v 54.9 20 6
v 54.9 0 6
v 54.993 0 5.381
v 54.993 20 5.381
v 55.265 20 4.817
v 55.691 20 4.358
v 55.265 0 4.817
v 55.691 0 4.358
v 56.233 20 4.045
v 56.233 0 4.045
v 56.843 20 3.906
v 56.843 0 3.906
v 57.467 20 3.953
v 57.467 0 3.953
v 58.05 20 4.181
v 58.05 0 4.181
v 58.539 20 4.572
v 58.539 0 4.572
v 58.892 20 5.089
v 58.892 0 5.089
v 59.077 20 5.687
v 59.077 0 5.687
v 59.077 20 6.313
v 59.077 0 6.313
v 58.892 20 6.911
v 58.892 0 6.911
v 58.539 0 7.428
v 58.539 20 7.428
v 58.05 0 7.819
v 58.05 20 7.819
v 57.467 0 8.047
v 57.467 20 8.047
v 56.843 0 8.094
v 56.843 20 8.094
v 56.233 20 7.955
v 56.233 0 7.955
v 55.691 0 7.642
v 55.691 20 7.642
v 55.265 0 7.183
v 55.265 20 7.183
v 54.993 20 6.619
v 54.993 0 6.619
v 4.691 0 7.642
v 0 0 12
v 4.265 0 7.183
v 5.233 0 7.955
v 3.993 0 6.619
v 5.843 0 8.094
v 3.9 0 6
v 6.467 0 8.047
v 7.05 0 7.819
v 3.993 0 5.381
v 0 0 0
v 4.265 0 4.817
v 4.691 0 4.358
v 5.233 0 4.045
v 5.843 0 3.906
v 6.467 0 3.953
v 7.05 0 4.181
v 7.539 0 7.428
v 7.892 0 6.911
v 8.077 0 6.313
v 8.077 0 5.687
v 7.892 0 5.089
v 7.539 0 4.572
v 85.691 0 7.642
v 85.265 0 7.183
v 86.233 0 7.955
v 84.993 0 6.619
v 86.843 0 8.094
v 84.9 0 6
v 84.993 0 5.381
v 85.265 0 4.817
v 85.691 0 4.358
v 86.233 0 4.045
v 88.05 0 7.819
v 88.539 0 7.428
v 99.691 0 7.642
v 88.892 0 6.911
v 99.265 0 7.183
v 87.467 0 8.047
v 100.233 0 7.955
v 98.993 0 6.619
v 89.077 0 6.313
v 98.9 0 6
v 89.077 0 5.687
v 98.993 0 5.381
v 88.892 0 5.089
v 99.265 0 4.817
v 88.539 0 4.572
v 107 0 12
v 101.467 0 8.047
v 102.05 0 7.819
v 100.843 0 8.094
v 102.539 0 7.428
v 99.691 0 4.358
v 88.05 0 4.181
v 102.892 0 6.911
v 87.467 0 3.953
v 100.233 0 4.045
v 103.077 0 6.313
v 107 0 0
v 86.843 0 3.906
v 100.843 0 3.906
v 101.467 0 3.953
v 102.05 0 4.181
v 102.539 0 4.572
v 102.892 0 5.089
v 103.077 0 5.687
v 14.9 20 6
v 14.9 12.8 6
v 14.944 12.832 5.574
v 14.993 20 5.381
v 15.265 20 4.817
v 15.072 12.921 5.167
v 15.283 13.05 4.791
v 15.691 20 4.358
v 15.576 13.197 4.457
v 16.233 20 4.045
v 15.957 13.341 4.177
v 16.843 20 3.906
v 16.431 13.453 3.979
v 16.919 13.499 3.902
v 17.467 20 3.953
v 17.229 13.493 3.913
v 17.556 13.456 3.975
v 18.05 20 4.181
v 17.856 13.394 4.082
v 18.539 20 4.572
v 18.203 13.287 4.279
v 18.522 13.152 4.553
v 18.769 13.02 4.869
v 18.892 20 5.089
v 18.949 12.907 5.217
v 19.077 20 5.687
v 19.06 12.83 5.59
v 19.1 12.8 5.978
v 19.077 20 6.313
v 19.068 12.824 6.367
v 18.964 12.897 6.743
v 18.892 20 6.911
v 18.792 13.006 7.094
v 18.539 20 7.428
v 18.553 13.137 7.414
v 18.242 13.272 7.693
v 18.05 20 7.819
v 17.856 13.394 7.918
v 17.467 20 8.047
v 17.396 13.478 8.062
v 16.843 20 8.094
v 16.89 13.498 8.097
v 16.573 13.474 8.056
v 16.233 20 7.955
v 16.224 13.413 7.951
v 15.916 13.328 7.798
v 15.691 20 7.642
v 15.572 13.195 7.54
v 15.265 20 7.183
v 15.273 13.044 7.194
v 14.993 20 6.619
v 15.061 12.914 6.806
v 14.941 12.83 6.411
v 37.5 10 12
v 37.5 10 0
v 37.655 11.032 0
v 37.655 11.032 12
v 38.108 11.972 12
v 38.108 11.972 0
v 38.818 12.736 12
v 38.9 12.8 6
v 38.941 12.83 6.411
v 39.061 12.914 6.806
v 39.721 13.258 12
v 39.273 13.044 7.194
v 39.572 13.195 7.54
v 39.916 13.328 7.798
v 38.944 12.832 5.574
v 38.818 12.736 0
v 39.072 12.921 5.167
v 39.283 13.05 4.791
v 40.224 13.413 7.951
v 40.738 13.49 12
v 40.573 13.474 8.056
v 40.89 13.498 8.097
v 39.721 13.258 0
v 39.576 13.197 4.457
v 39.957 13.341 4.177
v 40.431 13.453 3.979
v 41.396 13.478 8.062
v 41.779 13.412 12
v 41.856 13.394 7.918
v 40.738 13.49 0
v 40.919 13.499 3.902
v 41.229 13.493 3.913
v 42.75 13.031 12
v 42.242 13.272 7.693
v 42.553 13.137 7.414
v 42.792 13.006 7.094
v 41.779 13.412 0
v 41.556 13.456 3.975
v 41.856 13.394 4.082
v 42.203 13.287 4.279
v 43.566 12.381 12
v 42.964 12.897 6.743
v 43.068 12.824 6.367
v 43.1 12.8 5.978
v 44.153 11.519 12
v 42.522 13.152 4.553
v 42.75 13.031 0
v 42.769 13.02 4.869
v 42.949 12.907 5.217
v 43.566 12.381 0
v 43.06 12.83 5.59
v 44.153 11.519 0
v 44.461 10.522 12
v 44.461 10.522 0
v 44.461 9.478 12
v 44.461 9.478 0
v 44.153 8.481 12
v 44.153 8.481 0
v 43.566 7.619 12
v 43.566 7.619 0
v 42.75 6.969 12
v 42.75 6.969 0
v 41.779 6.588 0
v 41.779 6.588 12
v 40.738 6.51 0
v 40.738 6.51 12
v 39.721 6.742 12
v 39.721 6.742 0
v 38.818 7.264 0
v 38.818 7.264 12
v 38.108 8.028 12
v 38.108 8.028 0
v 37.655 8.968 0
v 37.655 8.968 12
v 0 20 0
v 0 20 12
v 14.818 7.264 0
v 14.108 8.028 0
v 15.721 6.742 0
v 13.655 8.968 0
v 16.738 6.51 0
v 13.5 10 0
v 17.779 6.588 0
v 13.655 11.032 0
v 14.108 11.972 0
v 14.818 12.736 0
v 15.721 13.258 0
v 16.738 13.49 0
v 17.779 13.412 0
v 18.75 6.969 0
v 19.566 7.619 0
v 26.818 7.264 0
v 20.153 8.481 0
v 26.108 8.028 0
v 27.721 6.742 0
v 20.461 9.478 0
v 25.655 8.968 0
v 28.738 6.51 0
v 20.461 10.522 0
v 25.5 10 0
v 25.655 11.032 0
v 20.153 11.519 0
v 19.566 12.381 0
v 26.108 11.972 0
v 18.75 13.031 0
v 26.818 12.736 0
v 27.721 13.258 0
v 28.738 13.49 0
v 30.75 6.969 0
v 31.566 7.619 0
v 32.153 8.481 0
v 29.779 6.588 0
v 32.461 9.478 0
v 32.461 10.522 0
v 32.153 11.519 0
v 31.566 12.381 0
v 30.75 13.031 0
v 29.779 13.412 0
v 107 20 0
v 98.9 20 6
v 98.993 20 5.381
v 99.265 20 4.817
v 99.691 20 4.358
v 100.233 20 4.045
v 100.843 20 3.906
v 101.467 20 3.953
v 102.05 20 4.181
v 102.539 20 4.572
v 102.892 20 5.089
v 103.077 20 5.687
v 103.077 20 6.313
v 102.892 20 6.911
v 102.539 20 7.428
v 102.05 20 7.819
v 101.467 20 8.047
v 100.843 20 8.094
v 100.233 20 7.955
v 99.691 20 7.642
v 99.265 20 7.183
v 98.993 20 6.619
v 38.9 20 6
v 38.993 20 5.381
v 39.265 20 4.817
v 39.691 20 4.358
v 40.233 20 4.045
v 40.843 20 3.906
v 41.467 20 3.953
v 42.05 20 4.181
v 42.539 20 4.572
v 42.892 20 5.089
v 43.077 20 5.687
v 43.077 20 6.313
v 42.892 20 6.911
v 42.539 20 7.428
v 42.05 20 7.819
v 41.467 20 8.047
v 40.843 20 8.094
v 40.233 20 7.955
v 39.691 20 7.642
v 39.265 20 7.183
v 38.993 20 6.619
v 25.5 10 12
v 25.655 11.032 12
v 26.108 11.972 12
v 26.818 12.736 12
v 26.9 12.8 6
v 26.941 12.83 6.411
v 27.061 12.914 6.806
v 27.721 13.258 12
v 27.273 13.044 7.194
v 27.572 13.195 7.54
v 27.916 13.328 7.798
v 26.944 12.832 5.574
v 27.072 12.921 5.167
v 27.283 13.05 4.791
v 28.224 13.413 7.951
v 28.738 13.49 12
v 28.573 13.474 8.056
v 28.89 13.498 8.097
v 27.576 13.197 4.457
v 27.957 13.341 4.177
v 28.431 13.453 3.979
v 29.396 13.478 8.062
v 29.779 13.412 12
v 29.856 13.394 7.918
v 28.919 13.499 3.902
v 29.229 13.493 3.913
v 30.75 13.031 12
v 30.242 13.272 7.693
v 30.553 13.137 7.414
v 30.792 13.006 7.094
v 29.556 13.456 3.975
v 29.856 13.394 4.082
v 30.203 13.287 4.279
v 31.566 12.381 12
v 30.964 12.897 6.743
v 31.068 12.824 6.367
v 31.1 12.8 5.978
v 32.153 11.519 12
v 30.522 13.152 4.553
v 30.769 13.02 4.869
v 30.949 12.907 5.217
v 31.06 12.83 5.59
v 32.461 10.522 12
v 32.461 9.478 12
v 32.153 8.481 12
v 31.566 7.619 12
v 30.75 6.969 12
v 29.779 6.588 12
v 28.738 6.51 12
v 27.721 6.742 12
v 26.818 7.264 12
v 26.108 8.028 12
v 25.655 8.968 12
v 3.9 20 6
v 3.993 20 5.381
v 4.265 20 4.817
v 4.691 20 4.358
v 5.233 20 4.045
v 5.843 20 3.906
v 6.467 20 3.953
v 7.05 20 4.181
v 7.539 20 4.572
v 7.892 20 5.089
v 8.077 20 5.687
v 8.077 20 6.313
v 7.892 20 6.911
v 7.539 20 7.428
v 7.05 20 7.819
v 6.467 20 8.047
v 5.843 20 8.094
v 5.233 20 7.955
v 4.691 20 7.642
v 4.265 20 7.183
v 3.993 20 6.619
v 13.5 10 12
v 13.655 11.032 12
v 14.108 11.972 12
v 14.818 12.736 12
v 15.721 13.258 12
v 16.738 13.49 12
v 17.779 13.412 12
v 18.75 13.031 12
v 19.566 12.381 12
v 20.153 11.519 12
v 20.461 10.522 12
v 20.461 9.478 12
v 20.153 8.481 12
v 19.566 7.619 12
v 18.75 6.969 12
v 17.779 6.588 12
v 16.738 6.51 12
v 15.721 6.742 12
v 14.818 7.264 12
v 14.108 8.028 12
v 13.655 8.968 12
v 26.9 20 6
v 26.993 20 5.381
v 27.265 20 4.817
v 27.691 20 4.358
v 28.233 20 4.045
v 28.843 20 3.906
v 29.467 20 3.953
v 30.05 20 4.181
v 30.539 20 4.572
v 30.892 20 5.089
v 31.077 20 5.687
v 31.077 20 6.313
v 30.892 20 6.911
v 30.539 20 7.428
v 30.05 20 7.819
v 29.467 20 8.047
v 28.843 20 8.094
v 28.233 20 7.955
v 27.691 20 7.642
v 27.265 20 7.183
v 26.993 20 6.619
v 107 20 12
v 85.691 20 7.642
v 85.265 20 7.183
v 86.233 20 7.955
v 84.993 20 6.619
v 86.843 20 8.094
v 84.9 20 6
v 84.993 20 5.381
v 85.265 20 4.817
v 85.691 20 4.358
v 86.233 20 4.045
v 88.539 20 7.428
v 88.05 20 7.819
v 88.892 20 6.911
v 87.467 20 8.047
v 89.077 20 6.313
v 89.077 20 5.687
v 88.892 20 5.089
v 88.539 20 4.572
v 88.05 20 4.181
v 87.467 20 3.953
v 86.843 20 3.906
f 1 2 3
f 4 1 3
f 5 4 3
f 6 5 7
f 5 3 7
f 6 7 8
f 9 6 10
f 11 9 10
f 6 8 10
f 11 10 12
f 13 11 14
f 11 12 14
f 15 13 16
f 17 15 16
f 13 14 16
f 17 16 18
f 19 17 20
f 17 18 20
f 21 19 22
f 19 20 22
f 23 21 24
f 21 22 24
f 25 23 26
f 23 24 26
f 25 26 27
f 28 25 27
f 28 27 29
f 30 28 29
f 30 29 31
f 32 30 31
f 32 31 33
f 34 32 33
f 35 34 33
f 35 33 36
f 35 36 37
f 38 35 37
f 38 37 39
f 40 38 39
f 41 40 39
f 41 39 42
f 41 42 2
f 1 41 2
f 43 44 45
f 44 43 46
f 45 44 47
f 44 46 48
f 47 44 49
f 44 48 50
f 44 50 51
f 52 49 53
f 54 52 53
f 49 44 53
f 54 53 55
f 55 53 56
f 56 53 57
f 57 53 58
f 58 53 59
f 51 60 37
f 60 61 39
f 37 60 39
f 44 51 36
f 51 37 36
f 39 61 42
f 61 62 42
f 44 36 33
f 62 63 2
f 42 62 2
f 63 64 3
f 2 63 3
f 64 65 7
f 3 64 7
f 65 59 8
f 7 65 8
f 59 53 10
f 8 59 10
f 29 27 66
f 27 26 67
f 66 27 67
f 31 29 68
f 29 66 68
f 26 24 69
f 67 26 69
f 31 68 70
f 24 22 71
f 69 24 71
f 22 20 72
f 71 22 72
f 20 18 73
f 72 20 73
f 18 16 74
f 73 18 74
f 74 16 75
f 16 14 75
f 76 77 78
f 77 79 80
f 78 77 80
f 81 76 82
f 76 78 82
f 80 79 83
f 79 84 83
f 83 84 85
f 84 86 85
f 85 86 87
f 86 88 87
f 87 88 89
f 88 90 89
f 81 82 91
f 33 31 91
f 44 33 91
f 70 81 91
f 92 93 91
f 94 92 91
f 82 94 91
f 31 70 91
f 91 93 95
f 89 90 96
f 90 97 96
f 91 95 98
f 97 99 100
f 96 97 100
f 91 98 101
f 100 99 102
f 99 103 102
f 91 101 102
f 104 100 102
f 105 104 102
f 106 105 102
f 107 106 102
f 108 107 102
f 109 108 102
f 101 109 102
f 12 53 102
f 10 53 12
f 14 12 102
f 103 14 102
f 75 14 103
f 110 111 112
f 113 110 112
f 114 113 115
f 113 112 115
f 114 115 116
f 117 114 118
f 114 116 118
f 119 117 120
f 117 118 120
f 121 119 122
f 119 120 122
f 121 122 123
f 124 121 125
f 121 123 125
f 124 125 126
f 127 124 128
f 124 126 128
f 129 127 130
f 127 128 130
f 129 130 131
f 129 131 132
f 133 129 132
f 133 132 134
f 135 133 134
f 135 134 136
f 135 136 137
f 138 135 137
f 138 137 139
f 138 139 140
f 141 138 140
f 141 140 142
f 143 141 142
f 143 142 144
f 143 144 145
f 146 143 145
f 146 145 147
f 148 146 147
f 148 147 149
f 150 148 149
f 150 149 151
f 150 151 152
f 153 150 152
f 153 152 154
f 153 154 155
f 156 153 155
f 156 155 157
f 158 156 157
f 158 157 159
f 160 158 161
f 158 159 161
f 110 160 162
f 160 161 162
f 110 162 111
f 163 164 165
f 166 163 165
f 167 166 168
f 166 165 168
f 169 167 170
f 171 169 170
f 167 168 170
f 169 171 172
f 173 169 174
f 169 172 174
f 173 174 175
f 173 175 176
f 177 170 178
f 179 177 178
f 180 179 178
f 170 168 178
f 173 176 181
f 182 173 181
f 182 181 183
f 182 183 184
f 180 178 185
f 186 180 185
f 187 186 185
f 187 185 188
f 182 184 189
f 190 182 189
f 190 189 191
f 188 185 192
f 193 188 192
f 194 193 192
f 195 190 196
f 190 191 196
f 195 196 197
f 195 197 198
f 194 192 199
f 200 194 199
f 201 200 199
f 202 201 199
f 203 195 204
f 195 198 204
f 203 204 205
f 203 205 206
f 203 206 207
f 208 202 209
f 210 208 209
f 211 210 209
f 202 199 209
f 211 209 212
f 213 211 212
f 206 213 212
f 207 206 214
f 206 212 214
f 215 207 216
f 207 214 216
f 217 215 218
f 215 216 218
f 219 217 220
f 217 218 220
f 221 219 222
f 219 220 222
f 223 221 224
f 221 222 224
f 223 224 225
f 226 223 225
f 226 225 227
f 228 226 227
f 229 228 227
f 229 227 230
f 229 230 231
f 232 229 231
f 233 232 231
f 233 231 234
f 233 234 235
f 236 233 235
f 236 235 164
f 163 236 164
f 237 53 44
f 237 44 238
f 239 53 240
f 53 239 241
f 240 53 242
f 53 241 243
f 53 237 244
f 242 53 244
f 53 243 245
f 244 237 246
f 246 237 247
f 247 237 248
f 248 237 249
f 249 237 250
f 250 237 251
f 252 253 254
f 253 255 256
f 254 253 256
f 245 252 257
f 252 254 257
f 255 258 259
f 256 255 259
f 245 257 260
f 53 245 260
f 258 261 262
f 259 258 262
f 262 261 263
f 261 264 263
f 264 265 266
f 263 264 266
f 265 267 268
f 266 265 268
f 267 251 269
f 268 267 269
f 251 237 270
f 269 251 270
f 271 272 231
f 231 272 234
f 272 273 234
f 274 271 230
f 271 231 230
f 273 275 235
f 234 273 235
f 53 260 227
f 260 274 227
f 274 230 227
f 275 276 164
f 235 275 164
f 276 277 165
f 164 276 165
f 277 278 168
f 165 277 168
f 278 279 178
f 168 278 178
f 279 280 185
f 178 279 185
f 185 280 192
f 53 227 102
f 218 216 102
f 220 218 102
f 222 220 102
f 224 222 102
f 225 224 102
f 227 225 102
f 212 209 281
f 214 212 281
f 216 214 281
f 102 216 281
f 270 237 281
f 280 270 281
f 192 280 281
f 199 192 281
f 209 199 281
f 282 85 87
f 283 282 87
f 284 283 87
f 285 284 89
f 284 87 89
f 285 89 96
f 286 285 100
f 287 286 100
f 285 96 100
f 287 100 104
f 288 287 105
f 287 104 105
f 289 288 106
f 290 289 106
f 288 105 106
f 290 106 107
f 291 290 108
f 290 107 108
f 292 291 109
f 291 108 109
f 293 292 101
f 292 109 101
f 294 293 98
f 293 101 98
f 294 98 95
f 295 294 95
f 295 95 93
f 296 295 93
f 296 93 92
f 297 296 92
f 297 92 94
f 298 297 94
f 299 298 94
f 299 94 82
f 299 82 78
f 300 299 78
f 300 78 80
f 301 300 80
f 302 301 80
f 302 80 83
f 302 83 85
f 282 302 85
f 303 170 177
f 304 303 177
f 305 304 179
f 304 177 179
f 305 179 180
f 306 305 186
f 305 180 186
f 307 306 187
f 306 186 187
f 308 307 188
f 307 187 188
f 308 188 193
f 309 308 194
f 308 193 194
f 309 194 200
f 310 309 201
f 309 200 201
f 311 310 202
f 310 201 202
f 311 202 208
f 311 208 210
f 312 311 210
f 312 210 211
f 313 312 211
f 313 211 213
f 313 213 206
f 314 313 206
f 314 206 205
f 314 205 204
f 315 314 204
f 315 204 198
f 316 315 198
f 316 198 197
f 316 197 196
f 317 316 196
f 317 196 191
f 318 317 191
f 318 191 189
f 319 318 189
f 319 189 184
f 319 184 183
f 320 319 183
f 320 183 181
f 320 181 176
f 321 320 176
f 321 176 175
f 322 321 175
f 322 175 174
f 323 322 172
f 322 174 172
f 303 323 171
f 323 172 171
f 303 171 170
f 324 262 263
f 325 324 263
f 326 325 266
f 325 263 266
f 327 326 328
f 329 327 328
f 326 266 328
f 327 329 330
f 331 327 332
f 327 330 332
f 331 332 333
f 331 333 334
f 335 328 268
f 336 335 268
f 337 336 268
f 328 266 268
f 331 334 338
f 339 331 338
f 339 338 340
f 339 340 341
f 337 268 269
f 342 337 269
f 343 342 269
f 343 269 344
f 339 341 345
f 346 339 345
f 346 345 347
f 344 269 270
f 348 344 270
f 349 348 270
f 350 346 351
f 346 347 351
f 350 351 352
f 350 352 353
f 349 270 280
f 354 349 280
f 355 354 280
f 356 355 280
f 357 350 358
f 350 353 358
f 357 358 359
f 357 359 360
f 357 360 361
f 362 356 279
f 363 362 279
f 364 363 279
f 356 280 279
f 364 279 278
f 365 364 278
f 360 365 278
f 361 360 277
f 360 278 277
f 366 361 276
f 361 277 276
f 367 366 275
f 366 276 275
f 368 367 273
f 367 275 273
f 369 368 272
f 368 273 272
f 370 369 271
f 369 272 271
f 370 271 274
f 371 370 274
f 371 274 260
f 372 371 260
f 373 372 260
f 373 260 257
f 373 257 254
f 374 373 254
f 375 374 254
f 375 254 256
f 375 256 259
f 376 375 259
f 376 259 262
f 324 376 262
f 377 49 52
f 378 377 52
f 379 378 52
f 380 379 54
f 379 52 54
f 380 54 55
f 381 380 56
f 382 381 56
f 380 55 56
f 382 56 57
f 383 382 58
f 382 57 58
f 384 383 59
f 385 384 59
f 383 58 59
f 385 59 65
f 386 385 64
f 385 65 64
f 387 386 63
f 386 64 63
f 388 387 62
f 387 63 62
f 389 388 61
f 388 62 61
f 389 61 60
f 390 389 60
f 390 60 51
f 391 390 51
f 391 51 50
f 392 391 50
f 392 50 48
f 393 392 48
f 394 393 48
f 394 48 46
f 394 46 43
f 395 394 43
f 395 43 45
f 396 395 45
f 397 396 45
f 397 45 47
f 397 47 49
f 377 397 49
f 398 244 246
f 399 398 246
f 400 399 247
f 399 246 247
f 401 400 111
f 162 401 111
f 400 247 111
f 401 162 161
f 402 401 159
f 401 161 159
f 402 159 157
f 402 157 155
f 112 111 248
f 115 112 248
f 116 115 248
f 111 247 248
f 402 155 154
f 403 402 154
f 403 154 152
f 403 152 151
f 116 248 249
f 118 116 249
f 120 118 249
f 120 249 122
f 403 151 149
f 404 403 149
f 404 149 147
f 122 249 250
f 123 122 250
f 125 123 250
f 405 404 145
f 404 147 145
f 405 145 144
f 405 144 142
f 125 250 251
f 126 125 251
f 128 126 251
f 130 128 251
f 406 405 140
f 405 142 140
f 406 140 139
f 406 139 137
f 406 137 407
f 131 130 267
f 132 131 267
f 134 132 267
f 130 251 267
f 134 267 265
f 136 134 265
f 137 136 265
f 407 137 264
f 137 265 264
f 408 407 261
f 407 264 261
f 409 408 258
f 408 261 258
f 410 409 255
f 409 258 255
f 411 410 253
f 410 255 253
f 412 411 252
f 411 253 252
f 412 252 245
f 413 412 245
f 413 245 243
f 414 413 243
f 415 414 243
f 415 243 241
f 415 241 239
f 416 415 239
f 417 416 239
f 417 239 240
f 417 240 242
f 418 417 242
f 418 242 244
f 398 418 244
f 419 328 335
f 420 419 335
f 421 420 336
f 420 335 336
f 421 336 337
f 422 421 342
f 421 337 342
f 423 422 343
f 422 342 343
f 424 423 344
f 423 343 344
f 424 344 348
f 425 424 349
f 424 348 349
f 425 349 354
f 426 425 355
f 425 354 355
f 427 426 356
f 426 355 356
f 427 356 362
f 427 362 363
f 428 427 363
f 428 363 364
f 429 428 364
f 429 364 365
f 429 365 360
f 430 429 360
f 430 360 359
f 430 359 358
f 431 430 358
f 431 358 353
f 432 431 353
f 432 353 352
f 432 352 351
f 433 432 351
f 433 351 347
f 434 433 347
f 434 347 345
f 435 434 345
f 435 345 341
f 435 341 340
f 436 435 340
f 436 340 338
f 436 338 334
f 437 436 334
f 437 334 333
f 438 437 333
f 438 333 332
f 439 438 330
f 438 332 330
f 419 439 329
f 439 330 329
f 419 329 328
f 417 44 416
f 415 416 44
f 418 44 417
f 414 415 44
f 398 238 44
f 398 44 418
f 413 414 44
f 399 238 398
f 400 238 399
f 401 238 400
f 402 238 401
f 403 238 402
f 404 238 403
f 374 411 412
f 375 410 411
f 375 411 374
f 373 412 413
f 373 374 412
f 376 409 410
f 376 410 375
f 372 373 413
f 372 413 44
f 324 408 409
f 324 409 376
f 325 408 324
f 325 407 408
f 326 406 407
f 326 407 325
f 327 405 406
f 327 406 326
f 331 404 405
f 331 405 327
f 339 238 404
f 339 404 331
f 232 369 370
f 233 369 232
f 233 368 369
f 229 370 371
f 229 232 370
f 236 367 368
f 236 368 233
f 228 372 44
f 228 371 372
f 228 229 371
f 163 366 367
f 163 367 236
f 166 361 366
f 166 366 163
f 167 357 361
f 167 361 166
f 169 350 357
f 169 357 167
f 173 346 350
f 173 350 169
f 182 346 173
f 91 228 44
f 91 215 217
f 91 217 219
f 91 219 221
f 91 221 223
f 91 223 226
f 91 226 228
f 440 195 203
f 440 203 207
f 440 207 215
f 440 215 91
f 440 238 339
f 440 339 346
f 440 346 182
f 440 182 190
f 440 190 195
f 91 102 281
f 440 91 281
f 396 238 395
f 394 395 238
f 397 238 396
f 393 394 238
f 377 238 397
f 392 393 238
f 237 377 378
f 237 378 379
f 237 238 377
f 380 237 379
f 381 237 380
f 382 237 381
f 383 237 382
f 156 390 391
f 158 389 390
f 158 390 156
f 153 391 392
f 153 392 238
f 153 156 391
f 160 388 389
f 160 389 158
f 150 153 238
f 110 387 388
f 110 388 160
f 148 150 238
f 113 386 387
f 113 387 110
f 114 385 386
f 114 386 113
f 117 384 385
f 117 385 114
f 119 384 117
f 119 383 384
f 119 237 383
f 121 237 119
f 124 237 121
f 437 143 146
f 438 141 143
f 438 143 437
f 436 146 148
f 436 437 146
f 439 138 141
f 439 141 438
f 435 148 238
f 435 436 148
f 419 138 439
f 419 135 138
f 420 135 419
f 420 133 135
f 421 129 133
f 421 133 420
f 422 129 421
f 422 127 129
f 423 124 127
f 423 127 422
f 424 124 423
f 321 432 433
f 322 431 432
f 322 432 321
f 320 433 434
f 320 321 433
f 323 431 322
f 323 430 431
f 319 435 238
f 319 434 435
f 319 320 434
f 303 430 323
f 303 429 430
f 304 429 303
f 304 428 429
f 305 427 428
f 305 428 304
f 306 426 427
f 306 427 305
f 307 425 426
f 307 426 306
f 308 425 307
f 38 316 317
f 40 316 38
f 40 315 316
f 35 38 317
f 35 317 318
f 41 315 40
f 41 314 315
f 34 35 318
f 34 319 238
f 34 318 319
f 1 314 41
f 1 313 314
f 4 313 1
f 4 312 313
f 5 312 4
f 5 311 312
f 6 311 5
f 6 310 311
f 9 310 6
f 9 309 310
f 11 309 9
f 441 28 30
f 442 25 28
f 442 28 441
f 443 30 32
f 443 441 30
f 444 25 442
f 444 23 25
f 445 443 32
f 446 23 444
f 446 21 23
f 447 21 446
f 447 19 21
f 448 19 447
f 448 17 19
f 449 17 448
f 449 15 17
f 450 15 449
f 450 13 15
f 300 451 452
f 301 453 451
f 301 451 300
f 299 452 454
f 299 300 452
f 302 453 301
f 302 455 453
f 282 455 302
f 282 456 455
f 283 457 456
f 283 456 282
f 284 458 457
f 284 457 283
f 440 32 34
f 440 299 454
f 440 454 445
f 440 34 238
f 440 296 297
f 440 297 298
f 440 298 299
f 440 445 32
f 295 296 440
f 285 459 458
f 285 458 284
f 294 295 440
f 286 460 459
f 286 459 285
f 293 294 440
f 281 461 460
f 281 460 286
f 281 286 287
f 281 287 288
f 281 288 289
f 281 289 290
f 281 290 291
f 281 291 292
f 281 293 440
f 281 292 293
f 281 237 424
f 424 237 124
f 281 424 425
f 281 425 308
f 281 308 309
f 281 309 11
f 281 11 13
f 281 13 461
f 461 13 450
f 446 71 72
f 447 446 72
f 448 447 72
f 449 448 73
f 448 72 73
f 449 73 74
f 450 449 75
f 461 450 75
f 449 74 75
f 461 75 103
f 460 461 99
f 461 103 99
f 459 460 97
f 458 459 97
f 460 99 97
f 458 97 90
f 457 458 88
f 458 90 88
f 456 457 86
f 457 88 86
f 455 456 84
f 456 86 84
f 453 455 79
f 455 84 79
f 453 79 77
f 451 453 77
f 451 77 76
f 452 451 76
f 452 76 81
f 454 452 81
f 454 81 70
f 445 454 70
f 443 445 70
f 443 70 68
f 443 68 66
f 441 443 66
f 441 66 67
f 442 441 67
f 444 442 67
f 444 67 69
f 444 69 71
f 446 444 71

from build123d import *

# Parameters (mm, degrees)
SKIZZE1_W                       = 107
SKIZZE1_H                       = 20
AUFSATZ_LINEAR_AUSTRAGEN1_DEPTH = 12
F_7_0_7_DURCHMESSER_BOHRUNG1_D  = 7
M5_GEWINDEBOHRUNG1_D            = 4.2
M5_GEWINDEBOHRUNG2_D            = 4.2
M5_GEWINDEBOHRUNG2_DEPTH        = 10
M5_GEWINDEBOHRUNG2_TIP          = 1.2618073


with BuildPart() as part:
    # Skizze1 → Aufsatz-Linear austragen1 (new body)
    with BuildSketch(Plane.XY):
        with Locations((53.5, 10)):
            Rectangle(SKIZZE1_W, SKIZZE1_H)
    extrude(amount=AUFSATZ_LINEAR_AUSTRAGEN1_DEPTH)

    # Ø7.0 (7) Durchmesser Bohrung1 (through all)
    with Locations(Plane.XY.offset(12)):
        with Locations((17, 10), (29, 10), (41, 10)):
            Hole(F_7_0_7_DURCHMESSER_BOHRUNG1_D / 2)

    # M5 Gewindebohrung1 (through all)
    with Locations(Plane(origin=(0, 20, 0), x_dir=(1, 0, 0), z_dir=(0, 1, 0))):
        with Locations((6, -6), (101, -6), (87, -6), (57, -6)):
            Hole(M5_GEWINDEBOHRUNG1_D / 2)

    # M5 Gewindebohrung2
    with Locations(Plane(origin=(0, 20, 0), x_dir=(1, 0, 0), z_dir=(0, 1, 0))):
        with Locations((17, -6), (29, -6), (41, -6)):
            Hole(M5_GEWINDEBOHRUNG2_D / 2, depth=M5_GEWINDEBOHRUNG2_DEPTH)
            with Locations((0, 0, -(M5_GEWINDEBOHRUNG2_DEPTH + M5_GEWINDEBOHRUNG2_TIP / 2))):  # 118° drill point
                Cone(0, M5_GEWINDEBOHRUNG2_D / 2, M5_GEWINDEBOHRUNG2_TIP, mode=Mode.SUBTRACT)


solid = part.part
